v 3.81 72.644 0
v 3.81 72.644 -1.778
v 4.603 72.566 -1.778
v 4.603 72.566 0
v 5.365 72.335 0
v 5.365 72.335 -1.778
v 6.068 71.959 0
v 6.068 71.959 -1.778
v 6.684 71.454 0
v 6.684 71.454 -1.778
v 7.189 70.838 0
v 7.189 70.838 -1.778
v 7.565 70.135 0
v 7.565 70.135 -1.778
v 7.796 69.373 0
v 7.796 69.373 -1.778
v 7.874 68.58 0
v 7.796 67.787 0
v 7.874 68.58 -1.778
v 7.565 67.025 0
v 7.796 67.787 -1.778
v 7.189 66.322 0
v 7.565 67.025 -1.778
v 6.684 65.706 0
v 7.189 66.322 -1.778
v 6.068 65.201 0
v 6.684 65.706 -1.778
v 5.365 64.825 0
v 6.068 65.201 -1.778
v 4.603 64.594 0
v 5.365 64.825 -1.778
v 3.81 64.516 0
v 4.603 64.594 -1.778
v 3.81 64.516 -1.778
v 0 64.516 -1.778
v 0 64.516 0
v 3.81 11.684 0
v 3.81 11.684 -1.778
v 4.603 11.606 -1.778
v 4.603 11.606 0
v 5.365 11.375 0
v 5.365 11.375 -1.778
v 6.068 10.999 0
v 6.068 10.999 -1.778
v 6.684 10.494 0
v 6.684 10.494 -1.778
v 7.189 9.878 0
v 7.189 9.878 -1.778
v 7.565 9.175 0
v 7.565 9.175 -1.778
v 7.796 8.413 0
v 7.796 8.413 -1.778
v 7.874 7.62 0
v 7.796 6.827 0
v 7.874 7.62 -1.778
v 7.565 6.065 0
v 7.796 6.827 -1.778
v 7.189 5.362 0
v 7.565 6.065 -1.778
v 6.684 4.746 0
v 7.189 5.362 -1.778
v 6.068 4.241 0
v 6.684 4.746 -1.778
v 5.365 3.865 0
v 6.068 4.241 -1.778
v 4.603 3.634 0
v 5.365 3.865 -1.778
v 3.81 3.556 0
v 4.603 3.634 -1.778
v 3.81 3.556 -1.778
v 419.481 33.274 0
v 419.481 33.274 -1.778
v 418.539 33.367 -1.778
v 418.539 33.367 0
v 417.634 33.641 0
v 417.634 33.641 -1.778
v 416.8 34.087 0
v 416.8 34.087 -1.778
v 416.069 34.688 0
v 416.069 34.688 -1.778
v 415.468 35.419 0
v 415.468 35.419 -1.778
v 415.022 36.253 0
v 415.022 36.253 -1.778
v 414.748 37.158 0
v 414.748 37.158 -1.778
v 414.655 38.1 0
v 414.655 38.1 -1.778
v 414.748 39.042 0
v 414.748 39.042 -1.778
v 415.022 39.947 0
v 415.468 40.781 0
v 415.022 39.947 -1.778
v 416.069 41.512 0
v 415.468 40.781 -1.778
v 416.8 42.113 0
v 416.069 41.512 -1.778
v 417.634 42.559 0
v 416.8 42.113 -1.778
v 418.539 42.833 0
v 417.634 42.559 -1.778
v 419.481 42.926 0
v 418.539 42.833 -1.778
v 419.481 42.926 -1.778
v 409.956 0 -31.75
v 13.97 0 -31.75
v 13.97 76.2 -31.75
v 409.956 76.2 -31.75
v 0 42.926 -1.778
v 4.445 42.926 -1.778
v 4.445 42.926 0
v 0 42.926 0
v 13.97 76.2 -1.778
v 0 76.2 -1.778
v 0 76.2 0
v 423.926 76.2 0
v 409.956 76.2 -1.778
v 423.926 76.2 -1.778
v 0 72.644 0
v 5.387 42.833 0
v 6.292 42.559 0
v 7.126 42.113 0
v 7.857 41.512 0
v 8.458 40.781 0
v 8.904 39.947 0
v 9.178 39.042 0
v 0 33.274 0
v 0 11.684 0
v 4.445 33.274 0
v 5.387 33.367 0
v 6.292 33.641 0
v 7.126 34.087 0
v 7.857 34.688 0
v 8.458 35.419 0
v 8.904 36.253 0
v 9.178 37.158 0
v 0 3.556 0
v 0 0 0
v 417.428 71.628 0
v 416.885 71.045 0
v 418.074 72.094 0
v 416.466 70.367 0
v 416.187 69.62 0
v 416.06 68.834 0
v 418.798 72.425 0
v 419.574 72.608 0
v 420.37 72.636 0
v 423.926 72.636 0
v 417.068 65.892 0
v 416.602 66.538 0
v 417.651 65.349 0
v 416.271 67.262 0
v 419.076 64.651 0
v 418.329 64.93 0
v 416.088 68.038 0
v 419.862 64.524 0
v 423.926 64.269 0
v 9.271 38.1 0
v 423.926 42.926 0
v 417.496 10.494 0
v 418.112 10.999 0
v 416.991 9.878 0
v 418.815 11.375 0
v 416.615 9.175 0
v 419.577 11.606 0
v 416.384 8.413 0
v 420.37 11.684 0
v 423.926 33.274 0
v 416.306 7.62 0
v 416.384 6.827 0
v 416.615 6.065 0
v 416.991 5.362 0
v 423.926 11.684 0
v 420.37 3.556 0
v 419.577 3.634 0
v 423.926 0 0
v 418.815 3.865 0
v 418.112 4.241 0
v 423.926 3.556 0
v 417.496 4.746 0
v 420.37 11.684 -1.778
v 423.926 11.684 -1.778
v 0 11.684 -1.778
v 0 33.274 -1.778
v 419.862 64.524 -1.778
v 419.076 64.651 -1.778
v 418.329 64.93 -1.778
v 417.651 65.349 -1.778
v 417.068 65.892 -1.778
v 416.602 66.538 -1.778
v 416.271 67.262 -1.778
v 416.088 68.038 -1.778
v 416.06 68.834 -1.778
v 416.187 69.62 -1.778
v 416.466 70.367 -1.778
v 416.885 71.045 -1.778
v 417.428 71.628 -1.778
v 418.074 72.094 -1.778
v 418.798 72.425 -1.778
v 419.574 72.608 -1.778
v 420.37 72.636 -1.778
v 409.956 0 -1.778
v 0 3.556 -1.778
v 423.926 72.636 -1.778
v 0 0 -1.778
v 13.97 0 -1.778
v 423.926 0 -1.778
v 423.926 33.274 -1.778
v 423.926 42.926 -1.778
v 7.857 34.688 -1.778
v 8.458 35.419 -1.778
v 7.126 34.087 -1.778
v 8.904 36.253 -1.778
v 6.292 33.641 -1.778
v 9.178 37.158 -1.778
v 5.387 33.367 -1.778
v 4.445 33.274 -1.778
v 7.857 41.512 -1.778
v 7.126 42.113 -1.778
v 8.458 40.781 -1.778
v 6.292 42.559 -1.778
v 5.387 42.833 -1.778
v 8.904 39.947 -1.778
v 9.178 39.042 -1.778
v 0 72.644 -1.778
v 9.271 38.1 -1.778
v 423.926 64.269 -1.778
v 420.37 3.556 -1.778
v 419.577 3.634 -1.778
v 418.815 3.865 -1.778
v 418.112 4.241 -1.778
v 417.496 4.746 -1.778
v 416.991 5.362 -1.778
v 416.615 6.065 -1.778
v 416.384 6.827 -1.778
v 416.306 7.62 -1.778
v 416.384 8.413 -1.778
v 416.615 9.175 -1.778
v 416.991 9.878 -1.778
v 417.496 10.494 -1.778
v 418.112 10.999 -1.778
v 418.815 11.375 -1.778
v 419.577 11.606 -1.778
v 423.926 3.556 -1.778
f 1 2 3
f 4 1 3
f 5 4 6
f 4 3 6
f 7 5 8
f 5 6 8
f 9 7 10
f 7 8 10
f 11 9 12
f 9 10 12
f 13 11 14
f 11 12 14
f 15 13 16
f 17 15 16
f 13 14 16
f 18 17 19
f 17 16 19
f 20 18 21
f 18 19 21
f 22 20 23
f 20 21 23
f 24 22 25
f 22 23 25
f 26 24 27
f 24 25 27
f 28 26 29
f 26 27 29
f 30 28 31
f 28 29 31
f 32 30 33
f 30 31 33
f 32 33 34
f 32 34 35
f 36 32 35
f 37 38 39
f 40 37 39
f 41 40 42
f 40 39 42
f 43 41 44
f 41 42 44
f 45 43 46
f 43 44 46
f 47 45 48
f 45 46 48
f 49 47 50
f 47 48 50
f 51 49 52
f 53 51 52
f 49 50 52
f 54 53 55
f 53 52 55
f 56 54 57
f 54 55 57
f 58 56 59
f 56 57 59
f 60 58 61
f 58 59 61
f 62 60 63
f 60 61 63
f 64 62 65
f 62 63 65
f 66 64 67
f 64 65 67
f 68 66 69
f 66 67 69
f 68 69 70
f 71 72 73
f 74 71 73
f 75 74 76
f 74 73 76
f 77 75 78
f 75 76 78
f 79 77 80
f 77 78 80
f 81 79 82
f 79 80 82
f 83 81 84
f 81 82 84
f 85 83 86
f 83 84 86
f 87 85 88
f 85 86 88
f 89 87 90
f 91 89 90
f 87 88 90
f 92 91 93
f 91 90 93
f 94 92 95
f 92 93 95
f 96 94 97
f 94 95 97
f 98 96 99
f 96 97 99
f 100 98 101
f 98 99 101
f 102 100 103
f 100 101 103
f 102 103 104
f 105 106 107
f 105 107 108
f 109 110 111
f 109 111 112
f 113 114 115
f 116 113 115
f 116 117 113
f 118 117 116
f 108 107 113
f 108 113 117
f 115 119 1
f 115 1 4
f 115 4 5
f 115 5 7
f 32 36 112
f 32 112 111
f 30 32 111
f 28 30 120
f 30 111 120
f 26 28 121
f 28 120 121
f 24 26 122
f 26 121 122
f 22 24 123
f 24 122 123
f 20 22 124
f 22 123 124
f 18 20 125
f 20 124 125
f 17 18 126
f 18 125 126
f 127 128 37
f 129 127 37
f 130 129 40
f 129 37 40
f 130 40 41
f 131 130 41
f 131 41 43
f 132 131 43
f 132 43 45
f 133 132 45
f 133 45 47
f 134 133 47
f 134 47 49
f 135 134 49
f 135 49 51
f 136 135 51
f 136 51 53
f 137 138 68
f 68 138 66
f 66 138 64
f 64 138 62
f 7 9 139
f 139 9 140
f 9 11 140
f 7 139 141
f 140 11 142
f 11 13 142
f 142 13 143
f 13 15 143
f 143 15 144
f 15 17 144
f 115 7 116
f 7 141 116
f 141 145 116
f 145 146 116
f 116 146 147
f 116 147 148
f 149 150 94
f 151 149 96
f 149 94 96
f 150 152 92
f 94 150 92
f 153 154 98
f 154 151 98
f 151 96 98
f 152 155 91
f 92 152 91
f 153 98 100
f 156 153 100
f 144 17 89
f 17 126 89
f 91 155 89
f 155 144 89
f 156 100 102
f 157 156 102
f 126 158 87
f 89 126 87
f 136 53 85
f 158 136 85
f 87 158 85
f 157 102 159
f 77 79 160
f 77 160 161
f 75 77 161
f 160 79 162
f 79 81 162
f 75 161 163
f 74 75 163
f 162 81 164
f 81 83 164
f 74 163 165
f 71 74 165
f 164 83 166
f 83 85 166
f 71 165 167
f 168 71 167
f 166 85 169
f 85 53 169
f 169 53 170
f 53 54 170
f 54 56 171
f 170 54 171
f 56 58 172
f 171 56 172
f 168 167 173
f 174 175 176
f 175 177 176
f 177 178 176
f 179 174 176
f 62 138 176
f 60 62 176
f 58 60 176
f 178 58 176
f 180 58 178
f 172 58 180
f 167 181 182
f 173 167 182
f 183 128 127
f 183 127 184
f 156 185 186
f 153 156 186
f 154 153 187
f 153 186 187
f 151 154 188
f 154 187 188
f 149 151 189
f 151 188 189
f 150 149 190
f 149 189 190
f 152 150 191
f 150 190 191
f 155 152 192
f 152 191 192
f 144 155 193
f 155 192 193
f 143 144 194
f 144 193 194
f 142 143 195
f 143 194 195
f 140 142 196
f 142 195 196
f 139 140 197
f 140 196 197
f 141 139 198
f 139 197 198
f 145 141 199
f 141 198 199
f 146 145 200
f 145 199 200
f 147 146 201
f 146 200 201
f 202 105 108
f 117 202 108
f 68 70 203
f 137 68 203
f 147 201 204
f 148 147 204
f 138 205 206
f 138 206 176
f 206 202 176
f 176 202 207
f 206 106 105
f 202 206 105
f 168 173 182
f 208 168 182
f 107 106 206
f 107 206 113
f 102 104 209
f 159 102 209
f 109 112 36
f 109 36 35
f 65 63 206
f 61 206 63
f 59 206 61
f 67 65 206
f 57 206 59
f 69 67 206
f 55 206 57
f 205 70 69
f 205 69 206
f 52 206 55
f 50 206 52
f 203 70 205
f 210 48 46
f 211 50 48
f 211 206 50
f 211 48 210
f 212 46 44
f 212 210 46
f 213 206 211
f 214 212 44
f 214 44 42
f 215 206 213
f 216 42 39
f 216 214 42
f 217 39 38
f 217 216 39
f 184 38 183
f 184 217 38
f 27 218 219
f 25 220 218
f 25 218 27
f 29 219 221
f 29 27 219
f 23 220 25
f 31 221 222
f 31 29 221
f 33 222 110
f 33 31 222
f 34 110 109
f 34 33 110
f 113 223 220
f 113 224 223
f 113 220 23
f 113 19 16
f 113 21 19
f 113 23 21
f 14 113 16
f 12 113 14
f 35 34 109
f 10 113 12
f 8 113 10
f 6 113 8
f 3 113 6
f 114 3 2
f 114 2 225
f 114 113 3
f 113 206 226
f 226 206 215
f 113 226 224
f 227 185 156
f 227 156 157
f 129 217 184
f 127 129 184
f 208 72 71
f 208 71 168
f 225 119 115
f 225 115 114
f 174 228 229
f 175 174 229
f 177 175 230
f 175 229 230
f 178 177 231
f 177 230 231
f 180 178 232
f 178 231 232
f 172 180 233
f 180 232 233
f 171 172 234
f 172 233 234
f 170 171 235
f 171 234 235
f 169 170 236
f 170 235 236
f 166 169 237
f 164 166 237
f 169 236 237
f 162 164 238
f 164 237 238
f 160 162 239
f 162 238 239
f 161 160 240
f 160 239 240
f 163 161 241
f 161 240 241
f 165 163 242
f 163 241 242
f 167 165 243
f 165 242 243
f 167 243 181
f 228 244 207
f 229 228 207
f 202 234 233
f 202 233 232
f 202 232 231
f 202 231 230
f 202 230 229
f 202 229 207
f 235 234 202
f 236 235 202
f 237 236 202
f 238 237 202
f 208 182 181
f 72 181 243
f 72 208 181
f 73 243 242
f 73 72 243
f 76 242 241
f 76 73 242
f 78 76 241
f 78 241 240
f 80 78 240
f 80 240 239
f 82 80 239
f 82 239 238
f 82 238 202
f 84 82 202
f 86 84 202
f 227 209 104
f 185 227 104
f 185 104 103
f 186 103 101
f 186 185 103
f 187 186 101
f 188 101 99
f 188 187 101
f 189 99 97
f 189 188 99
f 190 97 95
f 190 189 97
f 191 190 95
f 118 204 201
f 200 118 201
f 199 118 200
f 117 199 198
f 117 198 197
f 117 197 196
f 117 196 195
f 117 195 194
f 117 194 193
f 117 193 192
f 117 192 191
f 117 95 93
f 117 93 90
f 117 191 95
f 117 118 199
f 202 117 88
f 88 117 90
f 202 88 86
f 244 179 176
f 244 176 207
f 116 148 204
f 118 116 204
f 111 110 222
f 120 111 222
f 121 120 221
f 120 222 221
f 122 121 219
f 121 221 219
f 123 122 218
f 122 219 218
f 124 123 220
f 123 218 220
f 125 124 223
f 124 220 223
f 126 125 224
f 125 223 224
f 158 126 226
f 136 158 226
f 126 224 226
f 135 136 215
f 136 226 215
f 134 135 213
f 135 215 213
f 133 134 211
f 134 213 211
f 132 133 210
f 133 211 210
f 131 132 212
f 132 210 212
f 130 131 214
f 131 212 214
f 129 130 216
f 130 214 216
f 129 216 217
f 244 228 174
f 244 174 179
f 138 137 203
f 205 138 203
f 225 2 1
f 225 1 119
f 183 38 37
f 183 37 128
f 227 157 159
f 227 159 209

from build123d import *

# Parameters (mm, degrees)
SKETCH1_W           = 423.926
SKETCH1_H           = 31.75
BOSS_EXTRUDE1_DEPTH = 76.2
SKETCH5_W           = 13.97
SKETCH5_H           = 76.2
CUT_EXTRUDE5_DEPTH  = 29.972
SKETCH6_R           = 4.064
SKETCH6_R_2         = 4.826
CUT_EXTRUDE6_DEPTH  = 416.56
CUT_EXTRUDE7_DEPTH  = 2.778


with BuildPart() as part:
    # Sketch1 → Boss-Extrude1 (new body)
    with BuildSketch(Plane(origin=(0, 0, 0), x_dir=(1, 0, 0), z_dir=(0, 1, 0))):
        with Locations((211.963, 15.875)):
            Rectangle(SKETCH1_W, SKETCH1_H)
    extrude(amount=BOSS_EXTRUDE1_DEPTH)

    # Sketch5 → Cut-Extrude5 (cut)
    with BuildSketch(Plane(origin=(0, 0, -31.75), x_dir=(-1, 0, 0), z_dir=(0, 0, -1))):
        with Locations((-416.941, 38.1)):
            Rectangle(SKETCH5_W, SKETCH5_H)
        with Locations((-6.985, 38.1)):
            Rectangle(SKETCH5_W, SKETCH5_H)
    extrude(amount=-CUT_EXTRUDE5_DEPTH, mode=Mode.SUBTRACT)

    # Sketch6 → Cut-Extrude6 (cut)
    with BuildSketch(Plane(origin=(0, 0, -1.778), x_dir=(-1, 0, 0), z_dir=(0, 0, -1))):
        with Locations((-3.81, 7.62)):
            Circle(SKETCH6_R)
        with Locations((-3.81, 68.58)):
            Circle(SKETCH6_R)
        with Locations((-4.445, 38.1)):
            Circle(SKETCH6_R_2)
        with Locations((-420.37, 7.62)):
            Circle(SKETCH6_R)
        with Locations((-420.116, 68.58)):
            Circle(SKETCH6_R)
        with Locations((-419.481, 38.1)):
            Circle(SKETCH6_R_2)
    extrude(amount=-CUT_EXTRUDE6_DEPTH, mode=Mode.SUBTRACT)

    # Sketch8 → Cut-Extrude7 (cut, through all)
    with BuildSketch(Plane(origin=(0, 0, -1.778), x_dir=(-1, 0, 0), z_dir=(0, 0, -1))):
        Polygon((-419.862, 72.636054733), (-423.926, 72.636054733), (-423.926, 69.994212148), align=None)
        Polygon((-419.862, 64.523945267), (-423.926, 64.269447715), (-423.926, 67.165787852), align=None)
        Polygon((-419.481, 42.926), (-423.926, 42.926), (-423.926, 39.979428371), align=None)
        Polygon((-419.481, 33.274), (-423.926, 33.274), (-423.926, 36.220571629), align=None)
        Polygon((-420.37, 11.684), (-423.926, 11.684), (-423.926, 9.58747554), align=None)
        Polygon((-420.37, 3.556), (-423.926, 3.556), (-423.926, 5.65252446), align=None)
        Polygon((-3.81, 72.644), (0, 72.644), (0, 69.994212148), align=None)
        Polygon((-3.81, 64.516), (0, 64.516), (0, 67.165787852), align=None)
        Polygon((-4.445, 42.926), (0, 42.926), (0, 39.979428371), align=None)
        Polygon((-4.445, 33.274), (0, 33.274), (0, 36.220571629), align=None)
        Polygon((-3.81, 11.684), (0, 11.684), (0, 9.034212148), align=None)
        Polygon((-3.81, 3.556), (0, 3.556), (0, 6.205787852), align=None)
    extrude(amount=-CUT_EXTRUDE7_DEPTH, mode=Mode.SUBTRACT)


solid = part.part
